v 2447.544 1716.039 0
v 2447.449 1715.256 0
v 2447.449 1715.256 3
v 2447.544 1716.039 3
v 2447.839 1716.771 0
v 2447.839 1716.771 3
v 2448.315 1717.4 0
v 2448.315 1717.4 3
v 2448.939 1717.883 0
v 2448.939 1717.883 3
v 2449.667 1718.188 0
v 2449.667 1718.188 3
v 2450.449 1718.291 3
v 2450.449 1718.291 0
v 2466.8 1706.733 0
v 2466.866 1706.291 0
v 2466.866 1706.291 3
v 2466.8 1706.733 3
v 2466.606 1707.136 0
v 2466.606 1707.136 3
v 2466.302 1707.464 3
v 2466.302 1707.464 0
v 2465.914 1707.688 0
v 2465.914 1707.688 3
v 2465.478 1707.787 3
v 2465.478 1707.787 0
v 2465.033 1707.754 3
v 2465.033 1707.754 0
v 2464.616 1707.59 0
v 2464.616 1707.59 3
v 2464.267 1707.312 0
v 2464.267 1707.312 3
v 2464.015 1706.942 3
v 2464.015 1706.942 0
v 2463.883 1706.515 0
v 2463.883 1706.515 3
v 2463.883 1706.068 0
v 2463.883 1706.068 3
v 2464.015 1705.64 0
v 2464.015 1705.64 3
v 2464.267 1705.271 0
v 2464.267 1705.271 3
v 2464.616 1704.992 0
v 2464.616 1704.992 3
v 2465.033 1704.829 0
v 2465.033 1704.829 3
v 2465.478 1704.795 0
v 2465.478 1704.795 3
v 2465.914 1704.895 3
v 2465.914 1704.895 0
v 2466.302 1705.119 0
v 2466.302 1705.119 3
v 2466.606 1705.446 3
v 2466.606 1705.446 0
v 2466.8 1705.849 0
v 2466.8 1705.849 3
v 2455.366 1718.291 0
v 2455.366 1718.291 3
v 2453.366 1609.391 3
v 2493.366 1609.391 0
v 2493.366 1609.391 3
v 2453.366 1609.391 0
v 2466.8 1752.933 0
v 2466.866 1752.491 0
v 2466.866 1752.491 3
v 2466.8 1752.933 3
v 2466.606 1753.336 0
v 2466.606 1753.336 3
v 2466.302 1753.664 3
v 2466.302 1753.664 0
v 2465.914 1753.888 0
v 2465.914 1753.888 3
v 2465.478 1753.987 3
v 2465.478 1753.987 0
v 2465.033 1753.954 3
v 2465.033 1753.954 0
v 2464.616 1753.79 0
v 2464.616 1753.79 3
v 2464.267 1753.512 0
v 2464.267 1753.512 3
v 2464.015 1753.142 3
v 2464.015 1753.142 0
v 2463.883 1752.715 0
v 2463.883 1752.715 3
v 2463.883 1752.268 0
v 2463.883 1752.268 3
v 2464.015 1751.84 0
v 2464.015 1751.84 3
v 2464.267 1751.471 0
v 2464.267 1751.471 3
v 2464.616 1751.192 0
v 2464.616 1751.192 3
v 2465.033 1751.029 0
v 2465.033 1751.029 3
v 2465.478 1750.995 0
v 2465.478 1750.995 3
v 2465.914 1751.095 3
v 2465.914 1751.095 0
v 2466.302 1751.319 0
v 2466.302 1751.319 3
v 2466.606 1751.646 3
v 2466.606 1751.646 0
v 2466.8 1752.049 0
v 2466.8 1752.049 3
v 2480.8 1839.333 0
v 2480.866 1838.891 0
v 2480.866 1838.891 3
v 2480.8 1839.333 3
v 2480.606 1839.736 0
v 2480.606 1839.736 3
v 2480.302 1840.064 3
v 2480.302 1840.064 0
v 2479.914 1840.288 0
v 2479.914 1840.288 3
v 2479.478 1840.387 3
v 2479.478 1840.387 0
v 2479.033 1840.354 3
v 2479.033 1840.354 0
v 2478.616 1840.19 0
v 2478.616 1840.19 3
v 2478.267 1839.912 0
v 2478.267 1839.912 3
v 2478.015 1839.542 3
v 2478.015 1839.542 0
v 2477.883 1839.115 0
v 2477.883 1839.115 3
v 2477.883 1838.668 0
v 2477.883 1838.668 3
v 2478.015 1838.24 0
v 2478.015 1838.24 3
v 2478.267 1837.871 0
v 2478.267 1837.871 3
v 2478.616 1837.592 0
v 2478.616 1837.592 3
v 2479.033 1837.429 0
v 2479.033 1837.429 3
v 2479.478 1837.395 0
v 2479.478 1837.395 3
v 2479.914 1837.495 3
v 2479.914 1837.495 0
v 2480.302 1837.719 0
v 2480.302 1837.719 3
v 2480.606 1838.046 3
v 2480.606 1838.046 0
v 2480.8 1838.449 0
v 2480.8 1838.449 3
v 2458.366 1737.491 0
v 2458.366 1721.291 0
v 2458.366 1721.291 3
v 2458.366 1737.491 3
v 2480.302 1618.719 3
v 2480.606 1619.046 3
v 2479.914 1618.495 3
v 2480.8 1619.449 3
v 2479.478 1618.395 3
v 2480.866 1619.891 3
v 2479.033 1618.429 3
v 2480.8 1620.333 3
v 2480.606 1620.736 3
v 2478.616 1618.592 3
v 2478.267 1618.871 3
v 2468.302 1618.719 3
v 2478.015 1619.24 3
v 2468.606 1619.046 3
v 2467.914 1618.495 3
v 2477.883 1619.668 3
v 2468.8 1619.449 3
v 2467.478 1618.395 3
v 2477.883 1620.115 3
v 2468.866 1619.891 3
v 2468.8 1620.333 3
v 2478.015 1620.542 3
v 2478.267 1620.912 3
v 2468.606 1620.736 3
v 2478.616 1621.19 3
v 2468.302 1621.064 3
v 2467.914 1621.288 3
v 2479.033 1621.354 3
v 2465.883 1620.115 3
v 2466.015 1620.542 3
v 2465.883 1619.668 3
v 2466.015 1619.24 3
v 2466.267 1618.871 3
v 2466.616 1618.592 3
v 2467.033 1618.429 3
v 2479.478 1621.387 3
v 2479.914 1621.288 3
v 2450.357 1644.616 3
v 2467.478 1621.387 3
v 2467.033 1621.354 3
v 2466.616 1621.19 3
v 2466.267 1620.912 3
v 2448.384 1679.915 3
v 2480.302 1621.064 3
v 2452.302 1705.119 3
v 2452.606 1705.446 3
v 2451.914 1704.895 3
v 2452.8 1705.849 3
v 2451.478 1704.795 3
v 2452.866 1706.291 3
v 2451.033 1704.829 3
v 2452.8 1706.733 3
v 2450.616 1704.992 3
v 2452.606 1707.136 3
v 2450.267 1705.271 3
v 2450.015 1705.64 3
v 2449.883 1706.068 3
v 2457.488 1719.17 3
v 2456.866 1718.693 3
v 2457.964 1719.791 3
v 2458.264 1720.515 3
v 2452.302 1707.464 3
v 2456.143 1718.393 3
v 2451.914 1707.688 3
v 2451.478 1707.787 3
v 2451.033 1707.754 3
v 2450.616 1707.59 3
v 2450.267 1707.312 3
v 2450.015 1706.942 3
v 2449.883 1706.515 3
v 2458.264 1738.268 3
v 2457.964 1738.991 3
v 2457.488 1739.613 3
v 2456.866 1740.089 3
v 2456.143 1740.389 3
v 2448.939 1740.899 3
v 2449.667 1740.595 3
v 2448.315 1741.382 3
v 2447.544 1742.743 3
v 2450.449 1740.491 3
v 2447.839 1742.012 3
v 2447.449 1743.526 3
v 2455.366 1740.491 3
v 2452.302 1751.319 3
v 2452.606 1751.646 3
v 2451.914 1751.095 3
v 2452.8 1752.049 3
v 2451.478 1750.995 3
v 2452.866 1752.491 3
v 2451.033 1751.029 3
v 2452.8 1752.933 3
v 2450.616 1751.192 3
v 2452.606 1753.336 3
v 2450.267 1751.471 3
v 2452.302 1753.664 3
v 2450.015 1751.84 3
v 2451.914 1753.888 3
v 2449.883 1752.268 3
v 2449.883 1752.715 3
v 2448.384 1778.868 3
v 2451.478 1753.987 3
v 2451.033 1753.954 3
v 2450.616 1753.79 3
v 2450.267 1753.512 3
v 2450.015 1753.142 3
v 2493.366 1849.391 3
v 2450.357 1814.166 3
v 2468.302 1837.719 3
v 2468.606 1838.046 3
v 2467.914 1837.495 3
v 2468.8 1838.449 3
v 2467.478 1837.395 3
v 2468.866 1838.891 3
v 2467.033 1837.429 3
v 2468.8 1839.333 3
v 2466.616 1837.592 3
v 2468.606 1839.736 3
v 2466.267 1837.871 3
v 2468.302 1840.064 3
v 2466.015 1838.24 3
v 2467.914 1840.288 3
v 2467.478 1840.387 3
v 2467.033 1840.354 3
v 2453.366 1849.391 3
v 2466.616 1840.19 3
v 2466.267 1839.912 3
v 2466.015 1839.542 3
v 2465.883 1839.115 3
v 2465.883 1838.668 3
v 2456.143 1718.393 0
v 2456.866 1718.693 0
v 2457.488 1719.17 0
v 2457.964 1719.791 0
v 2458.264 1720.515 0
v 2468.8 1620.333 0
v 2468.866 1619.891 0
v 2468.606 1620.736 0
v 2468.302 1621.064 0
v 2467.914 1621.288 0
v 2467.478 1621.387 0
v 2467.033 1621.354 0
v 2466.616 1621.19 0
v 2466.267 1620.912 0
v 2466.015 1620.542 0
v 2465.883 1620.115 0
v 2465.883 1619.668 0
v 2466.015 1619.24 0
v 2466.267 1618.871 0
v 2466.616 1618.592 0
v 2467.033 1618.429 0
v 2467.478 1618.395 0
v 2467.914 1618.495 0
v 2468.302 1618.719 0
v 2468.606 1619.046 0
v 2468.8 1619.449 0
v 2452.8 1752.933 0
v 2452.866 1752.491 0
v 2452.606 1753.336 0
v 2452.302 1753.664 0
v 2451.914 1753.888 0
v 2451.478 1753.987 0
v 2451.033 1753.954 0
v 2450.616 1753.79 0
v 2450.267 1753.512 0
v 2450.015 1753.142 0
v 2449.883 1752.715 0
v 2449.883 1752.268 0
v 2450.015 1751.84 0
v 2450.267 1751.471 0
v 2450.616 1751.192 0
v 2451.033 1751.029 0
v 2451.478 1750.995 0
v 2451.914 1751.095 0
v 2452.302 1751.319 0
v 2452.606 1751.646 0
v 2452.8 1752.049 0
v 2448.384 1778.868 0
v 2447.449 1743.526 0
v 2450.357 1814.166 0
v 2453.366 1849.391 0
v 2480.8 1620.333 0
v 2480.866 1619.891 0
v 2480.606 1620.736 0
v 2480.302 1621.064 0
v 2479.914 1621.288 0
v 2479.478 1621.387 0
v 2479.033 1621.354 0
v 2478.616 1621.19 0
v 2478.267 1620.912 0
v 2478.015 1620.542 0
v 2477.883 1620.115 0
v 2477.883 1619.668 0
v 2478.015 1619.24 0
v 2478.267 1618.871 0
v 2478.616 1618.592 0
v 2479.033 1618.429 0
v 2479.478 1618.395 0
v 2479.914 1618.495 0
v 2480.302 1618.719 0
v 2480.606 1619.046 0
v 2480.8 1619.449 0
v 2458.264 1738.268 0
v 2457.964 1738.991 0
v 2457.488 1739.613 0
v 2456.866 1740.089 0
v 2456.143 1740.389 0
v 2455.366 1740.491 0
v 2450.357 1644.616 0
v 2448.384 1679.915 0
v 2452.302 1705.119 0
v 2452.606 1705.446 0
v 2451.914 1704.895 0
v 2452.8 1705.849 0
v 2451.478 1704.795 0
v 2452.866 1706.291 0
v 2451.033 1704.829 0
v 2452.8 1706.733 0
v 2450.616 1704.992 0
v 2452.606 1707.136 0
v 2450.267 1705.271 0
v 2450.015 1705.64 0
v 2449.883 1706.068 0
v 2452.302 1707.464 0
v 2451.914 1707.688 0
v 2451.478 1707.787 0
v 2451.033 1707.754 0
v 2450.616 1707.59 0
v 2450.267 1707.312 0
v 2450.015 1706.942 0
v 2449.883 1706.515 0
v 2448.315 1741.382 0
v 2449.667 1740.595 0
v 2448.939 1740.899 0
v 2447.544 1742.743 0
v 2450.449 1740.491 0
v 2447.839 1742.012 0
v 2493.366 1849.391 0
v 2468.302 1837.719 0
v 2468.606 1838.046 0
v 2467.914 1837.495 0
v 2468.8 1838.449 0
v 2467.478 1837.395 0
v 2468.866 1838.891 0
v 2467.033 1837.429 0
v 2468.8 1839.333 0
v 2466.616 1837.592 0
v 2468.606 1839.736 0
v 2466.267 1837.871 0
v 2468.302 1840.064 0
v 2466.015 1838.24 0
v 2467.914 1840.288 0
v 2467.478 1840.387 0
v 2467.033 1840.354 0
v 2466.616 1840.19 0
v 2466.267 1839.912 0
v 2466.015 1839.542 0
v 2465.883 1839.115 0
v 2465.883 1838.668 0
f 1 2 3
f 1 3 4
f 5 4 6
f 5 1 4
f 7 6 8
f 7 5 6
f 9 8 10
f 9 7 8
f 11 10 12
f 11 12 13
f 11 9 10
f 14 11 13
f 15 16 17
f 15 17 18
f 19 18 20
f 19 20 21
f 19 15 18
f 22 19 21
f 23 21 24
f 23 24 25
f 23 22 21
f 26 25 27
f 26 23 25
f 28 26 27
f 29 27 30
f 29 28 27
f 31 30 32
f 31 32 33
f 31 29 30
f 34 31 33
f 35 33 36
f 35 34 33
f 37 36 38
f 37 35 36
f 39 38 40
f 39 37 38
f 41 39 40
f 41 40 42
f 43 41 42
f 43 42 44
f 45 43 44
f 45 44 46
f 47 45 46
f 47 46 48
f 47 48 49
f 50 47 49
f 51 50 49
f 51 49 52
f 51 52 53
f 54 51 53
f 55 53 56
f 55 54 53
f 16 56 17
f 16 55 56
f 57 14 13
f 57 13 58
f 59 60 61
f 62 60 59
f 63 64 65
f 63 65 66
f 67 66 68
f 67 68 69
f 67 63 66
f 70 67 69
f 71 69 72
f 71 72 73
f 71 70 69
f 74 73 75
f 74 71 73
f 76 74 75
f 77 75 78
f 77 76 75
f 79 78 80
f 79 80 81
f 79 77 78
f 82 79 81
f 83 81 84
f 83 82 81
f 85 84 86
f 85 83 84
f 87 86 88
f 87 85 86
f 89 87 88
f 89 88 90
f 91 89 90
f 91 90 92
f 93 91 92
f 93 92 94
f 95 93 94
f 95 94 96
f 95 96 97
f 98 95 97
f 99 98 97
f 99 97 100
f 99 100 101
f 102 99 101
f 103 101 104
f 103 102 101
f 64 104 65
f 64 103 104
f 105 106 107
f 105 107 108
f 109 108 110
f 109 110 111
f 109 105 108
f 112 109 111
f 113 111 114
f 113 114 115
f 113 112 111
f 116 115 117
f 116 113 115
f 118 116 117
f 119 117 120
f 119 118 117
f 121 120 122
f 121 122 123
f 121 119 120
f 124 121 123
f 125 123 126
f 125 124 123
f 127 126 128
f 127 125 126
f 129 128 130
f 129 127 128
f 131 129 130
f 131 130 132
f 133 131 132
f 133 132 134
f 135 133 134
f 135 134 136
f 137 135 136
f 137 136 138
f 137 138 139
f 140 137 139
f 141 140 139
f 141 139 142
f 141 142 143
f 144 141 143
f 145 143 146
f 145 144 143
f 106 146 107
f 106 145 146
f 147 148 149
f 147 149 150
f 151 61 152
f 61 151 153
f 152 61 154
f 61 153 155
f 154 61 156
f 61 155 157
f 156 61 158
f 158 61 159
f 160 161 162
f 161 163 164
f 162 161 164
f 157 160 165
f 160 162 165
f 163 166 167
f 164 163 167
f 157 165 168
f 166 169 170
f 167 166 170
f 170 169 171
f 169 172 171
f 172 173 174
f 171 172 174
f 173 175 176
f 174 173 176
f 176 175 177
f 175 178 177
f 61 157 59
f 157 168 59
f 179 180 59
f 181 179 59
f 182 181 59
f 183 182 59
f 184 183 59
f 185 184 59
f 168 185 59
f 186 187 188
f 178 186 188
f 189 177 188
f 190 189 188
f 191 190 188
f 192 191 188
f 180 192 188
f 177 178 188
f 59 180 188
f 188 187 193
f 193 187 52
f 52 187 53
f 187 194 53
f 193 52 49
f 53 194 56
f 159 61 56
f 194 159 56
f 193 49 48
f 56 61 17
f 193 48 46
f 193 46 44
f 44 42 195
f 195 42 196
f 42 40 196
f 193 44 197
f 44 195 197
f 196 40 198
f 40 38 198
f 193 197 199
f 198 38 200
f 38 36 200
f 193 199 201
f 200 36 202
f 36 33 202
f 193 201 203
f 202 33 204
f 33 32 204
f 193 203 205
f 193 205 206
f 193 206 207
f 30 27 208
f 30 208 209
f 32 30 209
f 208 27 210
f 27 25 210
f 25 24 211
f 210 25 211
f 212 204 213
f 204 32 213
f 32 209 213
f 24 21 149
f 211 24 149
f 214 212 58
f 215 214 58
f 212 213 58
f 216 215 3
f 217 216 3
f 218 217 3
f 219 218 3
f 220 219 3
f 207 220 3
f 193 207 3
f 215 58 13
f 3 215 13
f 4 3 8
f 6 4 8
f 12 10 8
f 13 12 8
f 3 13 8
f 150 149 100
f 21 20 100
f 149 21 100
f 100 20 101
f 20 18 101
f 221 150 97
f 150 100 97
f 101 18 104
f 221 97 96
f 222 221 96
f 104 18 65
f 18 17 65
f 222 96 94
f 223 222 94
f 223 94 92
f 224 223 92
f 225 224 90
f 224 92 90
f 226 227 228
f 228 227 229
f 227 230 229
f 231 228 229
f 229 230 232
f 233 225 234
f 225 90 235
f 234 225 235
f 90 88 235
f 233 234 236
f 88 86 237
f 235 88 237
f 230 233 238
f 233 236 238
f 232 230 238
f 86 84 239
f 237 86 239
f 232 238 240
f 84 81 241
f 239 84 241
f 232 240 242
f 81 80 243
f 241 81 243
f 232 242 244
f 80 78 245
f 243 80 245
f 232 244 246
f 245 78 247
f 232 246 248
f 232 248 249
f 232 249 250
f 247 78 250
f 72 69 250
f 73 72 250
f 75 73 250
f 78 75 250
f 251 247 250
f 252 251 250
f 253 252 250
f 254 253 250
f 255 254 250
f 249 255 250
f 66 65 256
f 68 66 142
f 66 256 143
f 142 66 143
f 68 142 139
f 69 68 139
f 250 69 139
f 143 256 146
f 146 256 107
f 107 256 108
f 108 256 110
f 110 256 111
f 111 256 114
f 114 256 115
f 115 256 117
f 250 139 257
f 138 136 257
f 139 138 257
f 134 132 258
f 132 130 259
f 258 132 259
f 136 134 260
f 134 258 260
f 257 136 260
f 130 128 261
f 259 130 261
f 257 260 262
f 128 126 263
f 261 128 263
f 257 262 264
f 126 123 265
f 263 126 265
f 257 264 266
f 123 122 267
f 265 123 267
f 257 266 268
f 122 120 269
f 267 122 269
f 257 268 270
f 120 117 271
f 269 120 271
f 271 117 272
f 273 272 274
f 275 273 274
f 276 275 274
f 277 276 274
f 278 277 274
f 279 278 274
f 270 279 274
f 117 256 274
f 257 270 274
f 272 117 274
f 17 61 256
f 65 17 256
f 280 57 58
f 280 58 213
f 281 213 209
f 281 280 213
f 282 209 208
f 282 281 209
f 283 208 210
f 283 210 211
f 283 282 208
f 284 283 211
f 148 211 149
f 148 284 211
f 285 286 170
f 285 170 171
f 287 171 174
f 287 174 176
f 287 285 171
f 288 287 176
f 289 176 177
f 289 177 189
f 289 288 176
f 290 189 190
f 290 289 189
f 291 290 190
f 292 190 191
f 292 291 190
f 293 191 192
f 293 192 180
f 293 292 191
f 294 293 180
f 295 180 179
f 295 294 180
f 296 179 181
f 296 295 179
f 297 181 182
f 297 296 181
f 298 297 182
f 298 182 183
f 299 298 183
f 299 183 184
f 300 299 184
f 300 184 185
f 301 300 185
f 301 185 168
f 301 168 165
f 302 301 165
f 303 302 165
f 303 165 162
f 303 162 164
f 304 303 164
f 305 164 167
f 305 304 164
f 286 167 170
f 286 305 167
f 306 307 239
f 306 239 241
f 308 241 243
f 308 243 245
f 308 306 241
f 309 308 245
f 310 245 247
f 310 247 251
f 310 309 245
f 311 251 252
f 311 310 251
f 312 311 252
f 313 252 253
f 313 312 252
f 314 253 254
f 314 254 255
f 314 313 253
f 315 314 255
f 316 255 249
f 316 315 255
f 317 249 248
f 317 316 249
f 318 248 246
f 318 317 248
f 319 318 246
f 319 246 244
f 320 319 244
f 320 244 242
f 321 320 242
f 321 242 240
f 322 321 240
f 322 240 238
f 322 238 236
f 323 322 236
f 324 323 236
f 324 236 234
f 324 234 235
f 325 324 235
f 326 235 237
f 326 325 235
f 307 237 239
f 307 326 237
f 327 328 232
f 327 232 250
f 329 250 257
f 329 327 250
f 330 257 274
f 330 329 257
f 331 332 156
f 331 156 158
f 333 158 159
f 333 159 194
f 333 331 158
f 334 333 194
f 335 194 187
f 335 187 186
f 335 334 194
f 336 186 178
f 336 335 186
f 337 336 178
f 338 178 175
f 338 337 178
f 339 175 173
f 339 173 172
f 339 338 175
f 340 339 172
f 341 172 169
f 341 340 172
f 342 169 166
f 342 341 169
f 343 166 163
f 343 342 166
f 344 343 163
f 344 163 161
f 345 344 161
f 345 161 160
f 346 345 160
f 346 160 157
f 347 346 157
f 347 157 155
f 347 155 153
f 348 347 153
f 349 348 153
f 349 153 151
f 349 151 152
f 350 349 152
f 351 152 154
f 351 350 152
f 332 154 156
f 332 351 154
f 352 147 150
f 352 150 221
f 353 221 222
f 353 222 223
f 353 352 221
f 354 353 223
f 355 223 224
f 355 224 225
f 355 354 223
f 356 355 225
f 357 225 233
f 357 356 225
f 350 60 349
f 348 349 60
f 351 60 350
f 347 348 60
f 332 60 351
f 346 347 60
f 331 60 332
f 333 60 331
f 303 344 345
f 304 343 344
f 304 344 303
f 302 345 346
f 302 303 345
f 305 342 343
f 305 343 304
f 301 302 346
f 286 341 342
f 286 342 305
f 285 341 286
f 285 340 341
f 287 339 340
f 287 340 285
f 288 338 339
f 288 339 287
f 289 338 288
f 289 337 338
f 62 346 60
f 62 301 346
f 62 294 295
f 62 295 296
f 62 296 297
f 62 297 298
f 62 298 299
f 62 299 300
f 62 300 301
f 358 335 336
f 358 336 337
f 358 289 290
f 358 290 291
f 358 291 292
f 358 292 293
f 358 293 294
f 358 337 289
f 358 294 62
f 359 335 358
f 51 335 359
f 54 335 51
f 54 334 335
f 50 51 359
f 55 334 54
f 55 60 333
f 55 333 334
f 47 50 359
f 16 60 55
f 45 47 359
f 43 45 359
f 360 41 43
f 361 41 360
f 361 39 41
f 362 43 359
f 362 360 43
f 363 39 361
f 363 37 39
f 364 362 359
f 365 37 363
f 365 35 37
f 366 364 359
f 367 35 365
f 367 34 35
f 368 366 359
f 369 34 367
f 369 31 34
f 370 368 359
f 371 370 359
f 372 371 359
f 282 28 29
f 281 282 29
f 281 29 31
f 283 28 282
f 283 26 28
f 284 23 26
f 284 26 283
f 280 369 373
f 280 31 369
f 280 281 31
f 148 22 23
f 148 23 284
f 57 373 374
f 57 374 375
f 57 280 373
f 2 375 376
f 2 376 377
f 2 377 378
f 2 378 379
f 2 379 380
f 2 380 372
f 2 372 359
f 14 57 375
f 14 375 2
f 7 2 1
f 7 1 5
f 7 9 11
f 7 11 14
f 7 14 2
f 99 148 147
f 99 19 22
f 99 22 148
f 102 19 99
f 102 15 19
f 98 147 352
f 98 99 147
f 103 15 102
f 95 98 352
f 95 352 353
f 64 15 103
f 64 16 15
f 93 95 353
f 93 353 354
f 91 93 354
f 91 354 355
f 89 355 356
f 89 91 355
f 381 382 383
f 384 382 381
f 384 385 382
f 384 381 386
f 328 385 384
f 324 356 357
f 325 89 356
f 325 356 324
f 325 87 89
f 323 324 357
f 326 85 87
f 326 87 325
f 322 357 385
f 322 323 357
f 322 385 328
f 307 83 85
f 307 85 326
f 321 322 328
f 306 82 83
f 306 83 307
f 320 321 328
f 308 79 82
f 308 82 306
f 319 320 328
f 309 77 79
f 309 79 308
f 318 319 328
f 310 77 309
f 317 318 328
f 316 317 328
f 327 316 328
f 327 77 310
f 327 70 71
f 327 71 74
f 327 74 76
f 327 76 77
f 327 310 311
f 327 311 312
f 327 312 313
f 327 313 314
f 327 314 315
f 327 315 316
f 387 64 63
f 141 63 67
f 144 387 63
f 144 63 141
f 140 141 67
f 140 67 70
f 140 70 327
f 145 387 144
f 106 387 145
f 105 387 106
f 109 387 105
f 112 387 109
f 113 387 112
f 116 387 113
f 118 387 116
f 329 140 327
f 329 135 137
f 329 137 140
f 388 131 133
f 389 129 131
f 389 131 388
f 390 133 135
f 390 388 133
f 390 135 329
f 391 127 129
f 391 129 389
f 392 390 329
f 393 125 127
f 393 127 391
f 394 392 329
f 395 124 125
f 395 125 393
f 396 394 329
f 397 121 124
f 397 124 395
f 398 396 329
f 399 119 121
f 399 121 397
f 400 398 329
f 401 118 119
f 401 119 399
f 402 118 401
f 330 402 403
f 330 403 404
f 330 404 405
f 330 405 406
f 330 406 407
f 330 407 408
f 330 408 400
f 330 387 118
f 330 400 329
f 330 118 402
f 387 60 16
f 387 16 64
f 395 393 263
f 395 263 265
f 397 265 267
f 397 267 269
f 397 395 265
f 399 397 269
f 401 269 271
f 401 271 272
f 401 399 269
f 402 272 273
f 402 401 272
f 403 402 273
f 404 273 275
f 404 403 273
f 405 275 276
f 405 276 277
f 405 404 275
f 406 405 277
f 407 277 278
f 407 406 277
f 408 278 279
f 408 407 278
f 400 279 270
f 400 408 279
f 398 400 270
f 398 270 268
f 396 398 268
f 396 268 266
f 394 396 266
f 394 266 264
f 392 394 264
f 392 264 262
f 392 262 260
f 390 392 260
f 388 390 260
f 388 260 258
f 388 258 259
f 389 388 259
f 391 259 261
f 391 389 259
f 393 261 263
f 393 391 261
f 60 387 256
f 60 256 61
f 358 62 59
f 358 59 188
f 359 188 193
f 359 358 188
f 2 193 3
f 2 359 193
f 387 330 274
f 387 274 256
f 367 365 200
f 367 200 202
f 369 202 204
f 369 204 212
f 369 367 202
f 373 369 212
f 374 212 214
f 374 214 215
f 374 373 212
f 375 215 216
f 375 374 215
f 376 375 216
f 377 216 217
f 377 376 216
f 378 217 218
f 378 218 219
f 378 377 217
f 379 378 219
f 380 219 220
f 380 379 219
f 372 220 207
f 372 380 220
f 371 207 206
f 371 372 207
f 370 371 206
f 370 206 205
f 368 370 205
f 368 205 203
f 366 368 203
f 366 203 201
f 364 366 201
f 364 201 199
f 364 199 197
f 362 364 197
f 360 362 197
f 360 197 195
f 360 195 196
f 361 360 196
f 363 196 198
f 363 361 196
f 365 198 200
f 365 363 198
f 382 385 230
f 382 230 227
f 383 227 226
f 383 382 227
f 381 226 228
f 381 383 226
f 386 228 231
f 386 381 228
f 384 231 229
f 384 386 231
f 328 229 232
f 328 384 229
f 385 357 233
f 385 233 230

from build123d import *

# Parameters (mm, degrees)
MODEL_R         = 1.5
EXTRUDE_1_DEPTH = 3


with BuildPart() as part:
    # Model → 凸台-拉伸1 (new body)
    with BuildSketch(Plane.XY):
        with BuildLine():
            Line((2493.366322478, 1849.391249913), (2493.366322478, 1609.391249913))
            Line((2493.366322478, 1609.391249913), (2453.366322478, 1609.391249913))
            ThreePointArc((2453.366322478, 1609.391249913), (2449.24094139, 1662.258404711), (2447.449369938, 1715.255999913))
            ThreePointArc((2447.449369938, 1715.255999913), (2448.315416133, 1717.400070674), (2450.449162837, 1718.291249913))
            Line((2450.449162837, 1718.291249913), (2455.366322478, 1718.291249913))
            ThreePointArc((2455.366322478, 1718.291249913), (2457.487642822, 1719.16992957), (2458.366322478, 1721.291249913))
            Line((2458.366322478, 1721.291249913), (2458.366322478, 1737.491249913))
            ThreePointArc((2458.366322478, 1737.491249913), (2457.487642822, 1739.612570257), (2455.366322478, 1740.491249913))
            Line((2455.366322478, 1740.491249913), (2450.449162837, 1740.491249913))
            ThreePointArc((2450.449162837, 1740.491249913), (2448.315416133, 1741.382429153), (2447.449369938, 1743.526499913))
            ThreePointArc((2447.449369938, 1743.526499913), (2449.24094139, 1796.524095116), (2453.366322478, 1849.391249913))
            Line((2453.366322478, 1849.391249913), (2493.366322478, 1849.391249913))
        make_face()
        with Locations((2479.366322478, 1619.891249913)):
            Circle(MODEL_R, mode=Mode.SUBTRACT)
        with Locations((2467.366322478, 1619.891249913)):
            Circle(MODEL_R, mode=Mode.SUBTRACT)
        with Locations((2467.366322478, 1838.891249913)):
            Circle(MODEL_R, mode=Mode.SUBTRACT)
        with Locations((2479.366322478, 1838.891249913)):
            Circle(MODEL_R, mode=Mode.SUBTRACT)
        with Locations((2465.366322478, 1752.491249913)):
            Circle(MODEL_R, mode=Mode.SUBTRACT)
        with Locations((2465.366322478, 1706.291249913)):
            Circle(MODEL_R, mode=Mode.SUBTRACT)
        with Locations((2451.366322478, 1706.291249913)):
            Circle(MODEL_R, mode=Mode.SUBTRACT)
        with Locations((2451.366322478, 1752.491249913)):
            Circle(MODEL_R, mode=Mode.SUBTRACT)
    extrude(amount=EXTRUDE_1_DEPTH)


solid = part.part
